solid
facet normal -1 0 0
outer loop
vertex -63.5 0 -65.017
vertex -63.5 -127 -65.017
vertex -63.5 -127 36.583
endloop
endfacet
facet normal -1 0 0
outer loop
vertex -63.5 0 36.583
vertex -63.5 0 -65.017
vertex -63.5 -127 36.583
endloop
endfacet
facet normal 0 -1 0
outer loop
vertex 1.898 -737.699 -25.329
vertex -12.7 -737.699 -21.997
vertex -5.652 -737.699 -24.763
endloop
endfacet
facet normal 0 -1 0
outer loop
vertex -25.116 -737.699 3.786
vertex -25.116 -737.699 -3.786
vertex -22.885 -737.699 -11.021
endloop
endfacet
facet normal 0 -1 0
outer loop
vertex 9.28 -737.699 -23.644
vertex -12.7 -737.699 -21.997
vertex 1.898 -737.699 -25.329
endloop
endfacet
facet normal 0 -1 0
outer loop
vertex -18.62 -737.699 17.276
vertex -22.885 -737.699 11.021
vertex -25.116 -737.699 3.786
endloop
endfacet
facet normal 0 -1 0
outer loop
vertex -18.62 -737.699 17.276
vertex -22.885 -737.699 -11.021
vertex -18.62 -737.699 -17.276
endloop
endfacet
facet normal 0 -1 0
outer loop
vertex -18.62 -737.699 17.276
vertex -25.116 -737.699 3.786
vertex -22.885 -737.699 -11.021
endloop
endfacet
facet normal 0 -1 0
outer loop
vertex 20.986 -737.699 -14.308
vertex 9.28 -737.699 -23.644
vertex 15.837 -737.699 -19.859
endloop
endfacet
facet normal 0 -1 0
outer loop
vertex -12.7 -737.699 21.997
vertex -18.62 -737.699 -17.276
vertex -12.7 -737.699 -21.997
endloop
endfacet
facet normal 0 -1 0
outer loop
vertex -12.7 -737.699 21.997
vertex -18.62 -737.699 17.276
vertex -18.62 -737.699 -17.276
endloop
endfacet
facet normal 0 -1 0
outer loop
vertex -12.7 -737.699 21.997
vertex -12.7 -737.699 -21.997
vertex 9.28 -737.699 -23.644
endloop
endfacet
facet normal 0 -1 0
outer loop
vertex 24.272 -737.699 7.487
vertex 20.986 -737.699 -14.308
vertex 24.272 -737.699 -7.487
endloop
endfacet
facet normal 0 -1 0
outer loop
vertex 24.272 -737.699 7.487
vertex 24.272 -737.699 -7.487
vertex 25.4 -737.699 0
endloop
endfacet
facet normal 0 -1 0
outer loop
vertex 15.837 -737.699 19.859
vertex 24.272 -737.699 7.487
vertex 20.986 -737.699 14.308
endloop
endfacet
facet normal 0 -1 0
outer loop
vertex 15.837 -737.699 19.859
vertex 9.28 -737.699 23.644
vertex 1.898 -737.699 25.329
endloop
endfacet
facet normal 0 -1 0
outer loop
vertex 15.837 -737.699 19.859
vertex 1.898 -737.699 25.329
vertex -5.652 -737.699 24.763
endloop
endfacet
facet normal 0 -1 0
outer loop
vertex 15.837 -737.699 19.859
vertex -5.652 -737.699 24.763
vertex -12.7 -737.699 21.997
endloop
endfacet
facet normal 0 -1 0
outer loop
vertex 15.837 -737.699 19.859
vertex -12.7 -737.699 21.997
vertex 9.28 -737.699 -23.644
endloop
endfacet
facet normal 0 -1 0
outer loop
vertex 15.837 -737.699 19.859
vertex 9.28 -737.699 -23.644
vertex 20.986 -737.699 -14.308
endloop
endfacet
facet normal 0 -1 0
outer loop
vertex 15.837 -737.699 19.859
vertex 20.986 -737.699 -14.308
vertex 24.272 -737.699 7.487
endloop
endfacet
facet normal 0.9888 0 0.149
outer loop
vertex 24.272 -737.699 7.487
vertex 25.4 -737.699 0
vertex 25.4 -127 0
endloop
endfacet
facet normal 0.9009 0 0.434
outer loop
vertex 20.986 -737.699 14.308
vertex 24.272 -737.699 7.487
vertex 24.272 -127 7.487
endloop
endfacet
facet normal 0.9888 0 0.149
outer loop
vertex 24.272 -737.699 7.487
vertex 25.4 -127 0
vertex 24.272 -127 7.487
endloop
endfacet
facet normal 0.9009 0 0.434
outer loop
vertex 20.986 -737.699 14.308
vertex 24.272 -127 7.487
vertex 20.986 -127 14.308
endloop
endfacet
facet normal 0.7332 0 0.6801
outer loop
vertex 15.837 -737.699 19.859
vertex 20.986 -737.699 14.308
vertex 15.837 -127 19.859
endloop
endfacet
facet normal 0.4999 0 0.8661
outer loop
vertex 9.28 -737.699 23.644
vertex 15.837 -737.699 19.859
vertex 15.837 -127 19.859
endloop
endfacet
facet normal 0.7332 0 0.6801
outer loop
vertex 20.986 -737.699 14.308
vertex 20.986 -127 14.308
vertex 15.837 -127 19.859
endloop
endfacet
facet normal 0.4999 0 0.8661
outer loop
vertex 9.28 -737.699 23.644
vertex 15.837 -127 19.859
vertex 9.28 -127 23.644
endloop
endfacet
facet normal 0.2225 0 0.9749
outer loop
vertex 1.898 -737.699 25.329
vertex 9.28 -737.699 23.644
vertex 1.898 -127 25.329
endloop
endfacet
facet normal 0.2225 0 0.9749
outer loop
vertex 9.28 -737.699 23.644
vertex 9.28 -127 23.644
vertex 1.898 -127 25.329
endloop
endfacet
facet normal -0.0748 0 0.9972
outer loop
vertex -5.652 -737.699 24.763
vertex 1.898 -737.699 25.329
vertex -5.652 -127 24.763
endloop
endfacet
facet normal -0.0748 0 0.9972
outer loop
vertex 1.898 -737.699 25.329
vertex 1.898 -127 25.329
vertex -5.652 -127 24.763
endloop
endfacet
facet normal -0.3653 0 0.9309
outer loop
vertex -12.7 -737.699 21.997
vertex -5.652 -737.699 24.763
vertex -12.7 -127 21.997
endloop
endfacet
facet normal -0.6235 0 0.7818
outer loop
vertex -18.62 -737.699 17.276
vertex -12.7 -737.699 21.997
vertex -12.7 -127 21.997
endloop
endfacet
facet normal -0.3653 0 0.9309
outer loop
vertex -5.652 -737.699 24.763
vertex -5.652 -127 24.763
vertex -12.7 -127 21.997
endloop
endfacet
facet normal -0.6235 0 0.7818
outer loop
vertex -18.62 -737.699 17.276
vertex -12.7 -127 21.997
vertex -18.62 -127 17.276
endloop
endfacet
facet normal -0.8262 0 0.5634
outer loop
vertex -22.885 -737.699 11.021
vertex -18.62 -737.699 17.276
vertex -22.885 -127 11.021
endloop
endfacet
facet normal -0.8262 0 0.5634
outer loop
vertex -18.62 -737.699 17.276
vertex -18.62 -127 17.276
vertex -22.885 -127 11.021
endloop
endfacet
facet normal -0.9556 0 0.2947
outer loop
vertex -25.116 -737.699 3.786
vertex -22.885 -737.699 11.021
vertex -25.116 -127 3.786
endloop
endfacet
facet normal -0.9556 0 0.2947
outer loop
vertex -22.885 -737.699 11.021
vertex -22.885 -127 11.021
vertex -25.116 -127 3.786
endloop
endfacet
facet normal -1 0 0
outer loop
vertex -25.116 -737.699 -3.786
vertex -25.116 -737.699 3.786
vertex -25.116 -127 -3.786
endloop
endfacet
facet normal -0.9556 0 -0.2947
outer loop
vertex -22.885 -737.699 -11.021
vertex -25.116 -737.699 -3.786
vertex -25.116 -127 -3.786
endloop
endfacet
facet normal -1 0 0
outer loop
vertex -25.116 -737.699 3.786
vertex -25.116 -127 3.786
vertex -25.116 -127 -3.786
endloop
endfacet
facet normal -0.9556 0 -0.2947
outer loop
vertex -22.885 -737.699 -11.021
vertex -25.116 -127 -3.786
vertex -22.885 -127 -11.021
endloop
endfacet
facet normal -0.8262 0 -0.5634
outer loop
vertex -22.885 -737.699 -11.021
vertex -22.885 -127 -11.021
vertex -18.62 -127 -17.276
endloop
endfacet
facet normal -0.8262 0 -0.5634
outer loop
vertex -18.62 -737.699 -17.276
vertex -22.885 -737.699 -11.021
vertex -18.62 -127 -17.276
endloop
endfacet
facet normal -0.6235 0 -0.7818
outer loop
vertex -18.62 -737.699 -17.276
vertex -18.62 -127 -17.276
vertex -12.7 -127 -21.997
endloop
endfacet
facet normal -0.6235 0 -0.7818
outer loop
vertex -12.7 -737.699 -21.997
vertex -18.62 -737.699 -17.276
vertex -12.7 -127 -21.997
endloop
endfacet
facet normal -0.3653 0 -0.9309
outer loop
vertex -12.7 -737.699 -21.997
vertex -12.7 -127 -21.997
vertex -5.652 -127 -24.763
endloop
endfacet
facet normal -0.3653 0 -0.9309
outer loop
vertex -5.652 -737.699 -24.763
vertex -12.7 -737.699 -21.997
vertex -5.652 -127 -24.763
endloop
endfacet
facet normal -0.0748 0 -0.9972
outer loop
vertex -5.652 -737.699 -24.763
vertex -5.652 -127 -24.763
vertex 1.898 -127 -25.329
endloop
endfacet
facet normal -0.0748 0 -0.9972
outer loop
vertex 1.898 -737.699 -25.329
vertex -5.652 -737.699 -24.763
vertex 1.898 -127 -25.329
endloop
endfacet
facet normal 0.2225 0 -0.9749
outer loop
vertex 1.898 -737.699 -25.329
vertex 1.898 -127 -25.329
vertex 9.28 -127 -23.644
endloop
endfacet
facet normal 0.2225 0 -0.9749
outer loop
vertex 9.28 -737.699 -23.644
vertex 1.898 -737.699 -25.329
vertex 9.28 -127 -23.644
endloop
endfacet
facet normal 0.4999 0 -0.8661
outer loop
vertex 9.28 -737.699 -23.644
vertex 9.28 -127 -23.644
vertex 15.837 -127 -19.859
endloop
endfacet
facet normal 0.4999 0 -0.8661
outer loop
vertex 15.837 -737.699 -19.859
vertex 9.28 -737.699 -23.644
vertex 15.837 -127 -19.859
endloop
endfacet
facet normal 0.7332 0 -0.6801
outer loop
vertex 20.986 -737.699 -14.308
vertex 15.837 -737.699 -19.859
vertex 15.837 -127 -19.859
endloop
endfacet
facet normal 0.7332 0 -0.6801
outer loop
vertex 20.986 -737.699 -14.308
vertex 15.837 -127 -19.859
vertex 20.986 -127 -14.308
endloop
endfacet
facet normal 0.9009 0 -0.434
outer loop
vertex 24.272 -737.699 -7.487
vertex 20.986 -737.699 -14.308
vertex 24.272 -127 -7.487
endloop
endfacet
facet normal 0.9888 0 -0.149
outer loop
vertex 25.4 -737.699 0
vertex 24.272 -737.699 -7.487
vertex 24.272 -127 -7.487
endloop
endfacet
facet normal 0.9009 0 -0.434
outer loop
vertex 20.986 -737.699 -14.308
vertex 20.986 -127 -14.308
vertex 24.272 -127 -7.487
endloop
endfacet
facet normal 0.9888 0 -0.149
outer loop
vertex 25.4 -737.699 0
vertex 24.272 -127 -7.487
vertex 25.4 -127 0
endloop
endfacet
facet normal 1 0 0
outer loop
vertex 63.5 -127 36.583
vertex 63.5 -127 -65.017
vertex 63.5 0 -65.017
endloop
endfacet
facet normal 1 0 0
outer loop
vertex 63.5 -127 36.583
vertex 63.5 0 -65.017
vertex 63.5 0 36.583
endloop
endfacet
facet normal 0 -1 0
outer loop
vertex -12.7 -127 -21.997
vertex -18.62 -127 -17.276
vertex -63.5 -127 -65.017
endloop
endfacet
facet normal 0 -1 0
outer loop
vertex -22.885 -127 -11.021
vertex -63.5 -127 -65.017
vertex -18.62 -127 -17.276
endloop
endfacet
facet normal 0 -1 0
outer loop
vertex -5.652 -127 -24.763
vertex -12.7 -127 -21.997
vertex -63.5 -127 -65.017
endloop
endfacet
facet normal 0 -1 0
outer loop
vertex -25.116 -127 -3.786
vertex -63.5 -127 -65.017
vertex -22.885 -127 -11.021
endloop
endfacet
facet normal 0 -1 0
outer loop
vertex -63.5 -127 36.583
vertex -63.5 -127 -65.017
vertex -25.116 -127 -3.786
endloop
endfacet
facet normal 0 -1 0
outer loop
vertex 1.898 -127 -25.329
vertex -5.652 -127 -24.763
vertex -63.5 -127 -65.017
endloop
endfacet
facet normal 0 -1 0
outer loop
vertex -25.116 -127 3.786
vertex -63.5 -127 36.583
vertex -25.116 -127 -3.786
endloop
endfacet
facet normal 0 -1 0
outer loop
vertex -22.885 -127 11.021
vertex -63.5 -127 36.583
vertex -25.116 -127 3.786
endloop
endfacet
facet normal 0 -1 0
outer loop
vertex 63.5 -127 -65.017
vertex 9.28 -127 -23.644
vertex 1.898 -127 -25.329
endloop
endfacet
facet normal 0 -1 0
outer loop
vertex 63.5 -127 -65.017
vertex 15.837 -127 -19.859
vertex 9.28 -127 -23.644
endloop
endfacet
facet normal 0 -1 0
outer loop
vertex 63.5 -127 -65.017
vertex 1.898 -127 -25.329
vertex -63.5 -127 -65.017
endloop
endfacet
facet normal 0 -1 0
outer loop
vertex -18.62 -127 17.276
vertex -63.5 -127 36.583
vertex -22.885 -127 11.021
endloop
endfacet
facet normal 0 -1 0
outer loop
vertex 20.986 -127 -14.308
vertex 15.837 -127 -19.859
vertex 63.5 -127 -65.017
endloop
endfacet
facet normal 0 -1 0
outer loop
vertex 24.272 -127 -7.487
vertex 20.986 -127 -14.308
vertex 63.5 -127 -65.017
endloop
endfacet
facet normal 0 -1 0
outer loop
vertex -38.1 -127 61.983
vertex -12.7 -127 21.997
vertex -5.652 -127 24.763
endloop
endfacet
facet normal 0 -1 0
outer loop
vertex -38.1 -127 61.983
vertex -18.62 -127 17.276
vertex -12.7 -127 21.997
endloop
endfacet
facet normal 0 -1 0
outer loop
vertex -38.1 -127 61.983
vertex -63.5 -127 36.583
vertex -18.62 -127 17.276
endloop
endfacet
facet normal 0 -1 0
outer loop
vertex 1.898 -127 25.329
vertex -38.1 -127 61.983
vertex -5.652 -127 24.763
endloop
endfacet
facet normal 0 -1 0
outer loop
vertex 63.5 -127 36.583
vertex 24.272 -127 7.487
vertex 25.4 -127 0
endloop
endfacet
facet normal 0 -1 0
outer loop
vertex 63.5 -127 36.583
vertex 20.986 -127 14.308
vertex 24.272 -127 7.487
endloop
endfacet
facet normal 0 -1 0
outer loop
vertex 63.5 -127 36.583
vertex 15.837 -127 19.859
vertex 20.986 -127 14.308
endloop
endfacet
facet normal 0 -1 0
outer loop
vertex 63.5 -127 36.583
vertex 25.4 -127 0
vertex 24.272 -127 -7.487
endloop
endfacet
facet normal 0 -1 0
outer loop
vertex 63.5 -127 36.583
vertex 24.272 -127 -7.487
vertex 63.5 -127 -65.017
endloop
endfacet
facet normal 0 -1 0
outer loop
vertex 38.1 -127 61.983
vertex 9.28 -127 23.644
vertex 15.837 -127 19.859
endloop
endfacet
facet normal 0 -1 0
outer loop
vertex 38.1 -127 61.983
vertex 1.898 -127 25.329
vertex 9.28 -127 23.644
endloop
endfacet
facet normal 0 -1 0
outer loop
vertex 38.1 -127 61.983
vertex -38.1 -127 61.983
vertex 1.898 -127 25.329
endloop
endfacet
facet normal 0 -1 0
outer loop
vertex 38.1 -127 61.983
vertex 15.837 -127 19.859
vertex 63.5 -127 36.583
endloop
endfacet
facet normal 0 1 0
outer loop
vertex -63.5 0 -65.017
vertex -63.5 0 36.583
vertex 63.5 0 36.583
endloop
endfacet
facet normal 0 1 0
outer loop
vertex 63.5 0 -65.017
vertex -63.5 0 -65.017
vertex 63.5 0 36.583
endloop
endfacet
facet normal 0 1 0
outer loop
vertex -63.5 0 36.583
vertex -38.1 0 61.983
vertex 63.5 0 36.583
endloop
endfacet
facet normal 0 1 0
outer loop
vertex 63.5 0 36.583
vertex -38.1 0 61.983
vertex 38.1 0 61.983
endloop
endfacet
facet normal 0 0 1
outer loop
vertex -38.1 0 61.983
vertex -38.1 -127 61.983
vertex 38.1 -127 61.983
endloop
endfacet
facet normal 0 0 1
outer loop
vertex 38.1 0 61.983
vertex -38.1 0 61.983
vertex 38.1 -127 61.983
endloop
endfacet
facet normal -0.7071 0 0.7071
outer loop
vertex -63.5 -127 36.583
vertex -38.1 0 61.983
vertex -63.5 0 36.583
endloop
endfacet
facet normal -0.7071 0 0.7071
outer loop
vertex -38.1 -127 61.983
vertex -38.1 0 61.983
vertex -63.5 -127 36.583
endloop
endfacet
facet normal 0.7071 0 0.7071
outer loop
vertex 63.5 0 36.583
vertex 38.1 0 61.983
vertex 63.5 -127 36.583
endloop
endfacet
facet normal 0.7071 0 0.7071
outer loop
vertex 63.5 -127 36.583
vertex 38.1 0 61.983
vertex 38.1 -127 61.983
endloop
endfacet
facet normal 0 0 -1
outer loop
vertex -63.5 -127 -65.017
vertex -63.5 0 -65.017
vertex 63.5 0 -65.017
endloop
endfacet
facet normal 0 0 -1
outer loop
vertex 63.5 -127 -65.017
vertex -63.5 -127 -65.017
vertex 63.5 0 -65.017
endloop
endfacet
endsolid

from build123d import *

# Parameters (mm, degrees)
F0_W     = 127
F0_H     = 127
F1_DEPTH = 127
F2_SIZE  = 25.4
F3_R     = 25.4
F4_DEPTH = 610.6993397


# Not quite as in the source:
# - an extrude ends at something that could not be found from the text; its depth is read off the source's solid
# - a feature of the source that left no trace in its solid (it failed there, or was rolled back) is left out


with BuildPart() as f1:
    # F0 (on Front) → F1 (new body)
    with BuildSketch(Plane.XZ):
        with Locations((0, -1.5167773236)):
            Rectangle(F0_W, F0_H)
    extrude(amount=F1_DEPTH)

    # F2
    f2_edges = [f1.edges().sort_by_distance(p)[0] for p in [
        (-63.5, -63.5, 61.983223),
        (63.5, -63.5, 61.983223),
    ]]
    chamfer(f2_edges, length=F2_SIZE)

    # F3 (on face) → F4 (join, through all)
    with BuildSketch(Plane.XZ.offset(127)):
        Circle(F3_R)
    extrude(amount=F4_DEPTH)


solid = f1.part
